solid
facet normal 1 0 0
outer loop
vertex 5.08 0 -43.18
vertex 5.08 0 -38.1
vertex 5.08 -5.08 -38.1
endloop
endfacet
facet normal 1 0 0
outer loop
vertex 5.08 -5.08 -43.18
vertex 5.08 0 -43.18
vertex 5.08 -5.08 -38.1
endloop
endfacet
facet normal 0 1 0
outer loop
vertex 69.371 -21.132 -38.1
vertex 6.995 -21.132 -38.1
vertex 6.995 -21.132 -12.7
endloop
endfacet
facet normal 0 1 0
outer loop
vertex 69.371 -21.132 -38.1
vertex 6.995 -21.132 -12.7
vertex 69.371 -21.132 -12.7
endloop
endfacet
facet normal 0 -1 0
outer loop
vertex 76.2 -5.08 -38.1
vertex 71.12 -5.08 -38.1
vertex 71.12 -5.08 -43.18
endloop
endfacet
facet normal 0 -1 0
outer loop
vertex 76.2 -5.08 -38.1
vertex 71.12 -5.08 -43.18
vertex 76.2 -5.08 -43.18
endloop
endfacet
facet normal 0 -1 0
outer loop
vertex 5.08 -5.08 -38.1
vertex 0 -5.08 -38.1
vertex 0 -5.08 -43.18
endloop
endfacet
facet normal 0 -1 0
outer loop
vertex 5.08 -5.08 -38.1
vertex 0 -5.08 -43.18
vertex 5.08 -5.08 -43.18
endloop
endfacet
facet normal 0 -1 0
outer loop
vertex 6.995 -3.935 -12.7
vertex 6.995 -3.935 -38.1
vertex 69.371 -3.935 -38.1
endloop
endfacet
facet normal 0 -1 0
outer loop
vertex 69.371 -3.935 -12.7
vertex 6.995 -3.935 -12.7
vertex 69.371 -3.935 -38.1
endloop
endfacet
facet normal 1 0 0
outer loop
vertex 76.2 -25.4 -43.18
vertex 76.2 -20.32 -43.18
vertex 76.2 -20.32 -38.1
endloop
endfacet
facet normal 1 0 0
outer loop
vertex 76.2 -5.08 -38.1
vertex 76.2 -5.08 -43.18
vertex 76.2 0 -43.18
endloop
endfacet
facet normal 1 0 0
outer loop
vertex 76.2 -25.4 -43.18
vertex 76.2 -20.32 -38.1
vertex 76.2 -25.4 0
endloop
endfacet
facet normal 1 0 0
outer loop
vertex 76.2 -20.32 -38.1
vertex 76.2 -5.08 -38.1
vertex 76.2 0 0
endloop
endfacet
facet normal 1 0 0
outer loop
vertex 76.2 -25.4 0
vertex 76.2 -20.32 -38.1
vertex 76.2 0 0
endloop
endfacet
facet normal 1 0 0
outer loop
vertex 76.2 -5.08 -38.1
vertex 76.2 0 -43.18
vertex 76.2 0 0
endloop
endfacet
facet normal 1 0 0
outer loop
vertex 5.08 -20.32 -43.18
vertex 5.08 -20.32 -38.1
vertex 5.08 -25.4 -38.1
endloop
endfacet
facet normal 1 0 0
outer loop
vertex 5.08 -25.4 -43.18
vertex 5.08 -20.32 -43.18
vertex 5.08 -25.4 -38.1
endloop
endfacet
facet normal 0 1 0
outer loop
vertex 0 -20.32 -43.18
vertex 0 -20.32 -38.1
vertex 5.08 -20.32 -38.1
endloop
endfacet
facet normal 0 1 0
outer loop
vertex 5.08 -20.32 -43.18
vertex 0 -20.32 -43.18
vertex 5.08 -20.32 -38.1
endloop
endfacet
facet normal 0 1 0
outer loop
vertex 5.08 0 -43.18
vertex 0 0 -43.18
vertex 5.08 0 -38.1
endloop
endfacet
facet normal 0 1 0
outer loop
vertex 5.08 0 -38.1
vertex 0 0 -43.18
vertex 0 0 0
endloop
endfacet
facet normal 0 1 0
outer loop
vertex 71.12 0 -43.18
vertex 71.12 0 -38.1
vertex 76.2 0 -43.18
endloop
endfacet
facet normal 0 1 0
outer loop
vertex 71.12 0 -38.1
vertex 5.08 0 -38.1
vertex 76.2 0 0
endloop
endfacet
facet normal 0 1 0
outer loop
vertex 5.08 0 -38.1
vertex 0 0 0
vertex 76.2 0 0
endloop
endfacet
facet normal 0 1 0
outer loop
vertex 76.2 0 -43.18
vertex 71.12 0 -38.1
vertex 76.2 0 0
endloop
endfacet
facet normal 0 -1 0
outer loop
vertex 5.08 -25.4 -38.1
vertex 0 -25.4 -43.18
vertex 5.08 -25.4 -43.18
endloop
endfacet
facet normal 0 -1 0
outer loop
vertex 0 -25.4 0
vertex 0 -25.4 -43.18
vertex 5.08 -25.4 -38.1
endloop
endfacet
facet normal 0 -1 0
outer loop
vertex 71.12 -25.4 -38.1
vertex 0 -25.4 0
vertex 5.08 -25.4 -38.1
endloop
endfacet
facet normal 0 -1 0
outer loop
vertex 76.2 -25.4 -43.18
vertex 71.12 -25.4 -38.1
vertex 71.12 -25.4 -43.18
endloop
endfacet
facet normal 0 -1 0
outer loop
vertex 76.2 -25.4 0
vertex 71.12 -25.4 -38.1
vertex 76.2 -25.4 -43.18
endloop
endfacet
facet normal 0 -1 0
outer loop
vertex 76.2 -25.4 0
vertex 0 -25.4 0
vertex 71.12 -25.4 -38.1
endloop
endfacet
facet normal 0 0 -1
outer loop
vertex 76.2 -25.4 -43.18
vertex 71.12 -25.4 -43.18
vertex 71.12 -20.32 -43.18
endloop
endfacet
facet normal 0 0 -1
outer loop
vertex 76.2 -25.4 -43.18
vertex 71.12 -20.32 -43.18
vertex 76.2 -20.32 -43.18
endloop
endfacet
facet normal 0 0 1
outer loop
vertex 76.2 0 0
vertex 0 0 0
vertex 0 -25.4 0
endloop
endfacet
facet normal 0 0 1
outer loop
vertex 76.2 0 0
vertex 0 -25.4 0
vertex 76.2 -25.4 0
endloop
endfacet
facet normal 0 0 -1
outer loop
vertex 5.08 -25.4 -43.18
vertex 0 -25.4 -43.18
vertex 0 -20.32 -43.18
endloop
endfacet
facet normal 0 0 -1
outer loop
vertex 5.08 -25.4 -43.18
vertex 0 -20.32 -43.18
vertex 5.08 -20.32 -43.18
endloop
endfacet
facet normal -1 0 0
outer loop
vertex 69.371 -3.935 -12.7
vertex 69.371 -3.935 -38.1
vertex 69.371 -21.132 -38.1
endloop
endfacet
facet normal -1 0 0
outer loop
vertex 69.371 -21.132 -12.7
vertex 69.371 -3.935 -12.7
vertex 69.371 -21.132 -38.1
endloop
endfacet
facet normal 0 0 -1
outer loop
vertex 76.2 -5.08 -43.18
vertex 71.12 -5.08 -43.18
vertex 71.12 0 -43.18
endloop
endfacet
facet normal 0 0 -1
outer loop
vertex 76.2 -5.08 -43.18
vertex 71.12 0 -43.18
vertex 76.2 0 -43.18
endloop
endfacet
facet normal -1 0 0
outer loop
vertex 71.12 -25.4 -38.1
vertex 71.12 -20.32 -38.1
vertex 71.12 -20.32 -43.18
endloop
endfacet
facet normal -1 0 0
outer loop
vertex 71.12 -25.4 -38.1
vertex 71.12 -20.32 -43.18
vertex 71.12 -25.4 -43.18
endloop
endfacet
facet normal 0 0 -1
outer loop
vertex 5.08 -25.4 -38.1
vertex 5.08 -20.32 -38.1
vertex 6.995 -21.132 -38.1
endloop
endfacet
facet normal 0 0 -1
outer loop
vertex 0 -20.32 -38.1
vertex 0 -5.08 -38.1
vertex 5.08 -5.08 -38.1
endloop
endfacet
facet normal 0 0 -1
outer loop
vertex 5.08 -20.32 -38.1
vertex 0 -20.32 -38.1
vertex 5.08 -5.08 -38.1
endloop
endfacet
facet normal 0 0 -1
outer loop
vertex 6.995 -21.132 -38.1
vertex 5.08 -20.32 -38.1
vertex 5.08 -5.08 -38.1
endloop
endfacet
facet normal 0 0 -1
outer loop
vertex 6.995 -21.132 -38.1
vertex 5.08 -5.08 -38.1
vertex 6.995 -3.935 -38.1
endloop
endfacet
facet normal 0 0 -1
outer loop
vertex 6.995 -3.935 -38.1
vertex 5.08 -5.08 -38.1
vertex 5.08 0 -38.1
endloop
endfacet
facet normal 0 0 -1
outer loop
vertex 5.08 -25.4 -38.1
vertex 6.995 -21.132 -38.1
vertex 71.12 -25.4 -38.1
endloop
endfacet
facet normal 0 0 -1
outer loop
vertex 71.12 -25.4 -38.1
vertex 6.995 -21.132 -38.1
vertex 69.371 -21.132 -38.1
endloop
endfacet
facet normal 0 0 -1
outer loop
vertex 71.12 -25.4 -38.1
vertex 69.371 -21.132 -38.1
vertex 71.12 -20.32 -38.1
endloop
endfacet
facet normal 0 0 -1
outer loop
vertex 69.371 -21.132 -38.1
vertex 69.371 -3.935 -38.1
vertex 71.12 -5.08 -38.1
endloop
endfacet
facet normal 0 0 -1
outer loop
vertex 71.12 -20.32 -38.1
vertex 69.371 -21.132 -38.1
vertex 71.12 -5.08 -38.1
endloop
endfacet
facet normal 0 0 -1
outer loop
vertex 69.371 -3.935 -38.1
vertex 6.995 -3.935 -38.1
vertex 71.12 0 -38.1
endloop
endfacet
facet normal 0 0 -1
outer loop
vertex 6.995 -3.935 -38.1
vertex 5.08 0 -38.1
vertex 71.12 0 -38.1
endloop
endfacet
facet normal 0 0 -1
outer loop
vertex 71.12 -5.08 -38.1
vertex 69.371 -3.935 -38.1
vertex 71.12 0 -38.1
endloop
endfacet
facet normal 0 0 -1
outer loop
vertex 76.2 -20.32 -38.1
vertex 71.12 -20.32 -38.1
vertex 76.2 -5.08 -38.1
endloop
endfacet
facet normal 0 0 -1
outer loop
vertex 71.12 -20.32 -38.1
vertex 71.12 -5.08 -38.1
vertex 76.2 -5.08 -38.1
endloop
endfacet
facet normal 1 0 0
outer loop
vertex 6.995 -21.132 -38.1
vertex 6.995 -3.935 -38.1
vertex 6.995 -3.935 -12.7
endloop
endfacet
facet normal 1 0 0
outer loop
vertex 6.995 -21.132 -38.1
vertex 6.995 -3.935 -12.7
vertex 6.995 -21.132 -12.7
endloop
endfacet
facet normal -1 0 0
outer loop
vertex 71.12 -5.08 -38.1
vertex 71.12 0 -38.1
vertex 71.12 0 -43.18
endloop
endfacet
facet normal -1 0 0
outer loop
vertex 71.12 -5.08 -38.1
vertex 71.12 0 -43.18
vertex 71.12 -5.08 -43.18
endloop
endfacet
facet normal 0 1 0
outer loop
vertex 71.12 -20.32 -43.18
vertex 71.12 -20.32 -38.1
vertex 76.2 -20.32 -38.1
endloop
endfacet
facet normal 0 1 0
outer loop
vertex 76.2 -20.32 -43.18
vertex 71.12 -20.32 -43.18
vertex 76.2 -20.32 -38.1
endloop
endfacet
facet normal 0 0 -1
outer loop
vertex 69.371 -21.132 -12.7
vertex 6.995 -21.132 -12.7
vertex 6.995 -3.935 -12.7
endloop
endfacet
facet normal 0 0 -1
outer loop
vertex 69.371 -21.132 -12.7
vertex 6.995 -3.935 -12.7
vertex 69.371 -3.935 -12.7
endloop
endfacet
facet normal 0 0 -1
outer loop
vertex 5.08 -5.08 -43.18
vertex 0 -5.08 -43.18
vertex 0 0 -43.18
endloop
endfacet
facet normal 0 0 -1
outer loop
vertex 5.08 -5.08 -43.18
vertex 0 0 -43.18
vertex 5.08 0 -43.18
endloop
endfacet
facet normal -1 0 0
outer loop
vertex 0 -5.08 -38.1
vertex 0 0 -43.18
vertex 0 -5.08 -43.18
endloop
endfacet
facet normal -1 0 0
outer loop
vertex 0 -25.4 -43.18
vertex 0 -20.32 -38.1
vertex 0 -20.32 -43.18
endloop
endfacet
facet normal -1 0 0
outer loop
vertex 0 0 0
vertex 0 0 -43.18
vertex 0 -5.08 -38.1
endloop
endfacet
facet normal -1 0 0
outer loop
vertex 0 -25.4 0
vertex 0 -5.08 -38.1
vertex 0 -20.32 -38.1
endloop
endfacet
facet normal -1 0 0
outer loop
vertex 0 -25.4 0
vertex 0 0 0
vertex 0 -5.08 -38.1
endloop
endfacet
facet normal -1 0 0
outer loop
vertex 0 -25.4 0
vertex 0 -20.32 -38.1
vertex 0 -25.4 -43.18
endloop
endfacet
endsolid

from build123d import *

# Parameters (mm, degrees)
F0_W     = 76.2
F0_H     = 38.1
F1_DEPTH = 25.4
F2_W     = 5.08
F2_H     = 5.08
F3_DEPTH = 5.08
F4_W     = 62.375739
F4_H     = 17.19705
F5_DEPTH = 25.4


with BuildPart() as f1:
    # F0 (on Front) → F1 (new body)
    with BuildSketch(Plane.XZ):
        with Locations((38.1, -19.05)):
            Rectangle(F0_W, F0_H)
    extrude(amount=F1_DEPTH)

    # F2 (on face) → F3 (join)
    with BuildSketch(Plane(origin=(0, 0, -38.1), x_dir=(1, 0, 0), z_dir=(0, 0, -1))):
        with Locations((2.54, 22.86)):
            Rectangle(F2_W, F2_H)
        with Locations((2.54, 2.54)):
            Rectangle(F2_W, F2_H)
        with Locations((73.66, 22.86)):
            Rectangle(F2_W, F2_H)
        with Locations((73.66, 2.54)):
            Rectangle(F2_W, F2_H)
    extrude(amount=F3_DEPTH)

    # F4 (on face) → F5 (cut)
    with BuildSketch(Plane(origin=(0, 0, -38.1), x_dir=(1, 0, 0), z_dir=(0, 0, -1))):
        with Locations((38.183279, 12.533443)):
            Rectangle(F4_W, F4_H)
    extrude(amount=-F5_DEPTH, mode=Mode.SUBTRACT)


solid = f1.part
